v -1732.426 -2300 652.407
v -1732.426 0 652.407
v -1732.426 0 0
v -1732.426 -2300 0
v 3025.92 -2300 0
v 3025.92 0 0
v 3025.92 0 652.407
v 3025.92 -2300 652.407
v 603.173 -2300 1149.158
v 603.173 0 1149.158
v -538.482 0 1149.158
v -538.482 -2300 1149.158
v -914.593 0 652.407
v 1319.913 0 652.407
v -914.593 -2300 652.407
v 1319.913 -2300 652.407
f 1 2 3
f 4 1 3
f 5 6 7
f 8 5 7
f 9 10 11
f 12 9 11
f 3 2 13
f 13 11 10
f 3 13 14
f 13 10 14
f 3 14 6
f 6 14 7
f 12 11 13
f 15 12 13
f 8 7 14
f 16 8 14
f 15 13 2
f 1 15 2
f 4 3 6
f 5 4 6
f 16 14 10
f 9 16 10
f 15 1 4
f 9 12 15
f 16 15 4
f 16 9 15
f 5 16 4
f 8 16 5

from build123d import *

# Parameters (mm, degrees)
F1_DEPTH = 2300


with BuildPart() as f1:
    # F0 (on Front) → F1 (new body)
    with BuildSketch(Plane.XZ):
        Polygon((-1732.42569, 280.281354), (-1732.42569, 0), (-1123.595238, 0), (-810.496151, 0), (2393.774033, 0), (2706.873178, 0), (3025.920391, 0), (3025.920391, 280.281354), (2706.873178, 280.281354), (2393.774033, 280.281354), (-810.496151, 280.281354), (-1123.595238, 280.281354), align=None)
        Polygon((-1732.42569, 652.407207), (-1732.42569, 280.281354), (-1123.595238, 280.281354), (-810.496151, 280.281354), (2393.774033, 280.281354), (2706.873178, 280.281354), (3025.920391, 280.281354), (3025.920391, 652.407207), (1319.91277, 652.407207), (603.172839, 1149.157643), (-538.481712, 1149.157643), (-914.59273, 652.407207), align=None)
    extrude(amount=F1_DEPTH)


solid = f1.part
